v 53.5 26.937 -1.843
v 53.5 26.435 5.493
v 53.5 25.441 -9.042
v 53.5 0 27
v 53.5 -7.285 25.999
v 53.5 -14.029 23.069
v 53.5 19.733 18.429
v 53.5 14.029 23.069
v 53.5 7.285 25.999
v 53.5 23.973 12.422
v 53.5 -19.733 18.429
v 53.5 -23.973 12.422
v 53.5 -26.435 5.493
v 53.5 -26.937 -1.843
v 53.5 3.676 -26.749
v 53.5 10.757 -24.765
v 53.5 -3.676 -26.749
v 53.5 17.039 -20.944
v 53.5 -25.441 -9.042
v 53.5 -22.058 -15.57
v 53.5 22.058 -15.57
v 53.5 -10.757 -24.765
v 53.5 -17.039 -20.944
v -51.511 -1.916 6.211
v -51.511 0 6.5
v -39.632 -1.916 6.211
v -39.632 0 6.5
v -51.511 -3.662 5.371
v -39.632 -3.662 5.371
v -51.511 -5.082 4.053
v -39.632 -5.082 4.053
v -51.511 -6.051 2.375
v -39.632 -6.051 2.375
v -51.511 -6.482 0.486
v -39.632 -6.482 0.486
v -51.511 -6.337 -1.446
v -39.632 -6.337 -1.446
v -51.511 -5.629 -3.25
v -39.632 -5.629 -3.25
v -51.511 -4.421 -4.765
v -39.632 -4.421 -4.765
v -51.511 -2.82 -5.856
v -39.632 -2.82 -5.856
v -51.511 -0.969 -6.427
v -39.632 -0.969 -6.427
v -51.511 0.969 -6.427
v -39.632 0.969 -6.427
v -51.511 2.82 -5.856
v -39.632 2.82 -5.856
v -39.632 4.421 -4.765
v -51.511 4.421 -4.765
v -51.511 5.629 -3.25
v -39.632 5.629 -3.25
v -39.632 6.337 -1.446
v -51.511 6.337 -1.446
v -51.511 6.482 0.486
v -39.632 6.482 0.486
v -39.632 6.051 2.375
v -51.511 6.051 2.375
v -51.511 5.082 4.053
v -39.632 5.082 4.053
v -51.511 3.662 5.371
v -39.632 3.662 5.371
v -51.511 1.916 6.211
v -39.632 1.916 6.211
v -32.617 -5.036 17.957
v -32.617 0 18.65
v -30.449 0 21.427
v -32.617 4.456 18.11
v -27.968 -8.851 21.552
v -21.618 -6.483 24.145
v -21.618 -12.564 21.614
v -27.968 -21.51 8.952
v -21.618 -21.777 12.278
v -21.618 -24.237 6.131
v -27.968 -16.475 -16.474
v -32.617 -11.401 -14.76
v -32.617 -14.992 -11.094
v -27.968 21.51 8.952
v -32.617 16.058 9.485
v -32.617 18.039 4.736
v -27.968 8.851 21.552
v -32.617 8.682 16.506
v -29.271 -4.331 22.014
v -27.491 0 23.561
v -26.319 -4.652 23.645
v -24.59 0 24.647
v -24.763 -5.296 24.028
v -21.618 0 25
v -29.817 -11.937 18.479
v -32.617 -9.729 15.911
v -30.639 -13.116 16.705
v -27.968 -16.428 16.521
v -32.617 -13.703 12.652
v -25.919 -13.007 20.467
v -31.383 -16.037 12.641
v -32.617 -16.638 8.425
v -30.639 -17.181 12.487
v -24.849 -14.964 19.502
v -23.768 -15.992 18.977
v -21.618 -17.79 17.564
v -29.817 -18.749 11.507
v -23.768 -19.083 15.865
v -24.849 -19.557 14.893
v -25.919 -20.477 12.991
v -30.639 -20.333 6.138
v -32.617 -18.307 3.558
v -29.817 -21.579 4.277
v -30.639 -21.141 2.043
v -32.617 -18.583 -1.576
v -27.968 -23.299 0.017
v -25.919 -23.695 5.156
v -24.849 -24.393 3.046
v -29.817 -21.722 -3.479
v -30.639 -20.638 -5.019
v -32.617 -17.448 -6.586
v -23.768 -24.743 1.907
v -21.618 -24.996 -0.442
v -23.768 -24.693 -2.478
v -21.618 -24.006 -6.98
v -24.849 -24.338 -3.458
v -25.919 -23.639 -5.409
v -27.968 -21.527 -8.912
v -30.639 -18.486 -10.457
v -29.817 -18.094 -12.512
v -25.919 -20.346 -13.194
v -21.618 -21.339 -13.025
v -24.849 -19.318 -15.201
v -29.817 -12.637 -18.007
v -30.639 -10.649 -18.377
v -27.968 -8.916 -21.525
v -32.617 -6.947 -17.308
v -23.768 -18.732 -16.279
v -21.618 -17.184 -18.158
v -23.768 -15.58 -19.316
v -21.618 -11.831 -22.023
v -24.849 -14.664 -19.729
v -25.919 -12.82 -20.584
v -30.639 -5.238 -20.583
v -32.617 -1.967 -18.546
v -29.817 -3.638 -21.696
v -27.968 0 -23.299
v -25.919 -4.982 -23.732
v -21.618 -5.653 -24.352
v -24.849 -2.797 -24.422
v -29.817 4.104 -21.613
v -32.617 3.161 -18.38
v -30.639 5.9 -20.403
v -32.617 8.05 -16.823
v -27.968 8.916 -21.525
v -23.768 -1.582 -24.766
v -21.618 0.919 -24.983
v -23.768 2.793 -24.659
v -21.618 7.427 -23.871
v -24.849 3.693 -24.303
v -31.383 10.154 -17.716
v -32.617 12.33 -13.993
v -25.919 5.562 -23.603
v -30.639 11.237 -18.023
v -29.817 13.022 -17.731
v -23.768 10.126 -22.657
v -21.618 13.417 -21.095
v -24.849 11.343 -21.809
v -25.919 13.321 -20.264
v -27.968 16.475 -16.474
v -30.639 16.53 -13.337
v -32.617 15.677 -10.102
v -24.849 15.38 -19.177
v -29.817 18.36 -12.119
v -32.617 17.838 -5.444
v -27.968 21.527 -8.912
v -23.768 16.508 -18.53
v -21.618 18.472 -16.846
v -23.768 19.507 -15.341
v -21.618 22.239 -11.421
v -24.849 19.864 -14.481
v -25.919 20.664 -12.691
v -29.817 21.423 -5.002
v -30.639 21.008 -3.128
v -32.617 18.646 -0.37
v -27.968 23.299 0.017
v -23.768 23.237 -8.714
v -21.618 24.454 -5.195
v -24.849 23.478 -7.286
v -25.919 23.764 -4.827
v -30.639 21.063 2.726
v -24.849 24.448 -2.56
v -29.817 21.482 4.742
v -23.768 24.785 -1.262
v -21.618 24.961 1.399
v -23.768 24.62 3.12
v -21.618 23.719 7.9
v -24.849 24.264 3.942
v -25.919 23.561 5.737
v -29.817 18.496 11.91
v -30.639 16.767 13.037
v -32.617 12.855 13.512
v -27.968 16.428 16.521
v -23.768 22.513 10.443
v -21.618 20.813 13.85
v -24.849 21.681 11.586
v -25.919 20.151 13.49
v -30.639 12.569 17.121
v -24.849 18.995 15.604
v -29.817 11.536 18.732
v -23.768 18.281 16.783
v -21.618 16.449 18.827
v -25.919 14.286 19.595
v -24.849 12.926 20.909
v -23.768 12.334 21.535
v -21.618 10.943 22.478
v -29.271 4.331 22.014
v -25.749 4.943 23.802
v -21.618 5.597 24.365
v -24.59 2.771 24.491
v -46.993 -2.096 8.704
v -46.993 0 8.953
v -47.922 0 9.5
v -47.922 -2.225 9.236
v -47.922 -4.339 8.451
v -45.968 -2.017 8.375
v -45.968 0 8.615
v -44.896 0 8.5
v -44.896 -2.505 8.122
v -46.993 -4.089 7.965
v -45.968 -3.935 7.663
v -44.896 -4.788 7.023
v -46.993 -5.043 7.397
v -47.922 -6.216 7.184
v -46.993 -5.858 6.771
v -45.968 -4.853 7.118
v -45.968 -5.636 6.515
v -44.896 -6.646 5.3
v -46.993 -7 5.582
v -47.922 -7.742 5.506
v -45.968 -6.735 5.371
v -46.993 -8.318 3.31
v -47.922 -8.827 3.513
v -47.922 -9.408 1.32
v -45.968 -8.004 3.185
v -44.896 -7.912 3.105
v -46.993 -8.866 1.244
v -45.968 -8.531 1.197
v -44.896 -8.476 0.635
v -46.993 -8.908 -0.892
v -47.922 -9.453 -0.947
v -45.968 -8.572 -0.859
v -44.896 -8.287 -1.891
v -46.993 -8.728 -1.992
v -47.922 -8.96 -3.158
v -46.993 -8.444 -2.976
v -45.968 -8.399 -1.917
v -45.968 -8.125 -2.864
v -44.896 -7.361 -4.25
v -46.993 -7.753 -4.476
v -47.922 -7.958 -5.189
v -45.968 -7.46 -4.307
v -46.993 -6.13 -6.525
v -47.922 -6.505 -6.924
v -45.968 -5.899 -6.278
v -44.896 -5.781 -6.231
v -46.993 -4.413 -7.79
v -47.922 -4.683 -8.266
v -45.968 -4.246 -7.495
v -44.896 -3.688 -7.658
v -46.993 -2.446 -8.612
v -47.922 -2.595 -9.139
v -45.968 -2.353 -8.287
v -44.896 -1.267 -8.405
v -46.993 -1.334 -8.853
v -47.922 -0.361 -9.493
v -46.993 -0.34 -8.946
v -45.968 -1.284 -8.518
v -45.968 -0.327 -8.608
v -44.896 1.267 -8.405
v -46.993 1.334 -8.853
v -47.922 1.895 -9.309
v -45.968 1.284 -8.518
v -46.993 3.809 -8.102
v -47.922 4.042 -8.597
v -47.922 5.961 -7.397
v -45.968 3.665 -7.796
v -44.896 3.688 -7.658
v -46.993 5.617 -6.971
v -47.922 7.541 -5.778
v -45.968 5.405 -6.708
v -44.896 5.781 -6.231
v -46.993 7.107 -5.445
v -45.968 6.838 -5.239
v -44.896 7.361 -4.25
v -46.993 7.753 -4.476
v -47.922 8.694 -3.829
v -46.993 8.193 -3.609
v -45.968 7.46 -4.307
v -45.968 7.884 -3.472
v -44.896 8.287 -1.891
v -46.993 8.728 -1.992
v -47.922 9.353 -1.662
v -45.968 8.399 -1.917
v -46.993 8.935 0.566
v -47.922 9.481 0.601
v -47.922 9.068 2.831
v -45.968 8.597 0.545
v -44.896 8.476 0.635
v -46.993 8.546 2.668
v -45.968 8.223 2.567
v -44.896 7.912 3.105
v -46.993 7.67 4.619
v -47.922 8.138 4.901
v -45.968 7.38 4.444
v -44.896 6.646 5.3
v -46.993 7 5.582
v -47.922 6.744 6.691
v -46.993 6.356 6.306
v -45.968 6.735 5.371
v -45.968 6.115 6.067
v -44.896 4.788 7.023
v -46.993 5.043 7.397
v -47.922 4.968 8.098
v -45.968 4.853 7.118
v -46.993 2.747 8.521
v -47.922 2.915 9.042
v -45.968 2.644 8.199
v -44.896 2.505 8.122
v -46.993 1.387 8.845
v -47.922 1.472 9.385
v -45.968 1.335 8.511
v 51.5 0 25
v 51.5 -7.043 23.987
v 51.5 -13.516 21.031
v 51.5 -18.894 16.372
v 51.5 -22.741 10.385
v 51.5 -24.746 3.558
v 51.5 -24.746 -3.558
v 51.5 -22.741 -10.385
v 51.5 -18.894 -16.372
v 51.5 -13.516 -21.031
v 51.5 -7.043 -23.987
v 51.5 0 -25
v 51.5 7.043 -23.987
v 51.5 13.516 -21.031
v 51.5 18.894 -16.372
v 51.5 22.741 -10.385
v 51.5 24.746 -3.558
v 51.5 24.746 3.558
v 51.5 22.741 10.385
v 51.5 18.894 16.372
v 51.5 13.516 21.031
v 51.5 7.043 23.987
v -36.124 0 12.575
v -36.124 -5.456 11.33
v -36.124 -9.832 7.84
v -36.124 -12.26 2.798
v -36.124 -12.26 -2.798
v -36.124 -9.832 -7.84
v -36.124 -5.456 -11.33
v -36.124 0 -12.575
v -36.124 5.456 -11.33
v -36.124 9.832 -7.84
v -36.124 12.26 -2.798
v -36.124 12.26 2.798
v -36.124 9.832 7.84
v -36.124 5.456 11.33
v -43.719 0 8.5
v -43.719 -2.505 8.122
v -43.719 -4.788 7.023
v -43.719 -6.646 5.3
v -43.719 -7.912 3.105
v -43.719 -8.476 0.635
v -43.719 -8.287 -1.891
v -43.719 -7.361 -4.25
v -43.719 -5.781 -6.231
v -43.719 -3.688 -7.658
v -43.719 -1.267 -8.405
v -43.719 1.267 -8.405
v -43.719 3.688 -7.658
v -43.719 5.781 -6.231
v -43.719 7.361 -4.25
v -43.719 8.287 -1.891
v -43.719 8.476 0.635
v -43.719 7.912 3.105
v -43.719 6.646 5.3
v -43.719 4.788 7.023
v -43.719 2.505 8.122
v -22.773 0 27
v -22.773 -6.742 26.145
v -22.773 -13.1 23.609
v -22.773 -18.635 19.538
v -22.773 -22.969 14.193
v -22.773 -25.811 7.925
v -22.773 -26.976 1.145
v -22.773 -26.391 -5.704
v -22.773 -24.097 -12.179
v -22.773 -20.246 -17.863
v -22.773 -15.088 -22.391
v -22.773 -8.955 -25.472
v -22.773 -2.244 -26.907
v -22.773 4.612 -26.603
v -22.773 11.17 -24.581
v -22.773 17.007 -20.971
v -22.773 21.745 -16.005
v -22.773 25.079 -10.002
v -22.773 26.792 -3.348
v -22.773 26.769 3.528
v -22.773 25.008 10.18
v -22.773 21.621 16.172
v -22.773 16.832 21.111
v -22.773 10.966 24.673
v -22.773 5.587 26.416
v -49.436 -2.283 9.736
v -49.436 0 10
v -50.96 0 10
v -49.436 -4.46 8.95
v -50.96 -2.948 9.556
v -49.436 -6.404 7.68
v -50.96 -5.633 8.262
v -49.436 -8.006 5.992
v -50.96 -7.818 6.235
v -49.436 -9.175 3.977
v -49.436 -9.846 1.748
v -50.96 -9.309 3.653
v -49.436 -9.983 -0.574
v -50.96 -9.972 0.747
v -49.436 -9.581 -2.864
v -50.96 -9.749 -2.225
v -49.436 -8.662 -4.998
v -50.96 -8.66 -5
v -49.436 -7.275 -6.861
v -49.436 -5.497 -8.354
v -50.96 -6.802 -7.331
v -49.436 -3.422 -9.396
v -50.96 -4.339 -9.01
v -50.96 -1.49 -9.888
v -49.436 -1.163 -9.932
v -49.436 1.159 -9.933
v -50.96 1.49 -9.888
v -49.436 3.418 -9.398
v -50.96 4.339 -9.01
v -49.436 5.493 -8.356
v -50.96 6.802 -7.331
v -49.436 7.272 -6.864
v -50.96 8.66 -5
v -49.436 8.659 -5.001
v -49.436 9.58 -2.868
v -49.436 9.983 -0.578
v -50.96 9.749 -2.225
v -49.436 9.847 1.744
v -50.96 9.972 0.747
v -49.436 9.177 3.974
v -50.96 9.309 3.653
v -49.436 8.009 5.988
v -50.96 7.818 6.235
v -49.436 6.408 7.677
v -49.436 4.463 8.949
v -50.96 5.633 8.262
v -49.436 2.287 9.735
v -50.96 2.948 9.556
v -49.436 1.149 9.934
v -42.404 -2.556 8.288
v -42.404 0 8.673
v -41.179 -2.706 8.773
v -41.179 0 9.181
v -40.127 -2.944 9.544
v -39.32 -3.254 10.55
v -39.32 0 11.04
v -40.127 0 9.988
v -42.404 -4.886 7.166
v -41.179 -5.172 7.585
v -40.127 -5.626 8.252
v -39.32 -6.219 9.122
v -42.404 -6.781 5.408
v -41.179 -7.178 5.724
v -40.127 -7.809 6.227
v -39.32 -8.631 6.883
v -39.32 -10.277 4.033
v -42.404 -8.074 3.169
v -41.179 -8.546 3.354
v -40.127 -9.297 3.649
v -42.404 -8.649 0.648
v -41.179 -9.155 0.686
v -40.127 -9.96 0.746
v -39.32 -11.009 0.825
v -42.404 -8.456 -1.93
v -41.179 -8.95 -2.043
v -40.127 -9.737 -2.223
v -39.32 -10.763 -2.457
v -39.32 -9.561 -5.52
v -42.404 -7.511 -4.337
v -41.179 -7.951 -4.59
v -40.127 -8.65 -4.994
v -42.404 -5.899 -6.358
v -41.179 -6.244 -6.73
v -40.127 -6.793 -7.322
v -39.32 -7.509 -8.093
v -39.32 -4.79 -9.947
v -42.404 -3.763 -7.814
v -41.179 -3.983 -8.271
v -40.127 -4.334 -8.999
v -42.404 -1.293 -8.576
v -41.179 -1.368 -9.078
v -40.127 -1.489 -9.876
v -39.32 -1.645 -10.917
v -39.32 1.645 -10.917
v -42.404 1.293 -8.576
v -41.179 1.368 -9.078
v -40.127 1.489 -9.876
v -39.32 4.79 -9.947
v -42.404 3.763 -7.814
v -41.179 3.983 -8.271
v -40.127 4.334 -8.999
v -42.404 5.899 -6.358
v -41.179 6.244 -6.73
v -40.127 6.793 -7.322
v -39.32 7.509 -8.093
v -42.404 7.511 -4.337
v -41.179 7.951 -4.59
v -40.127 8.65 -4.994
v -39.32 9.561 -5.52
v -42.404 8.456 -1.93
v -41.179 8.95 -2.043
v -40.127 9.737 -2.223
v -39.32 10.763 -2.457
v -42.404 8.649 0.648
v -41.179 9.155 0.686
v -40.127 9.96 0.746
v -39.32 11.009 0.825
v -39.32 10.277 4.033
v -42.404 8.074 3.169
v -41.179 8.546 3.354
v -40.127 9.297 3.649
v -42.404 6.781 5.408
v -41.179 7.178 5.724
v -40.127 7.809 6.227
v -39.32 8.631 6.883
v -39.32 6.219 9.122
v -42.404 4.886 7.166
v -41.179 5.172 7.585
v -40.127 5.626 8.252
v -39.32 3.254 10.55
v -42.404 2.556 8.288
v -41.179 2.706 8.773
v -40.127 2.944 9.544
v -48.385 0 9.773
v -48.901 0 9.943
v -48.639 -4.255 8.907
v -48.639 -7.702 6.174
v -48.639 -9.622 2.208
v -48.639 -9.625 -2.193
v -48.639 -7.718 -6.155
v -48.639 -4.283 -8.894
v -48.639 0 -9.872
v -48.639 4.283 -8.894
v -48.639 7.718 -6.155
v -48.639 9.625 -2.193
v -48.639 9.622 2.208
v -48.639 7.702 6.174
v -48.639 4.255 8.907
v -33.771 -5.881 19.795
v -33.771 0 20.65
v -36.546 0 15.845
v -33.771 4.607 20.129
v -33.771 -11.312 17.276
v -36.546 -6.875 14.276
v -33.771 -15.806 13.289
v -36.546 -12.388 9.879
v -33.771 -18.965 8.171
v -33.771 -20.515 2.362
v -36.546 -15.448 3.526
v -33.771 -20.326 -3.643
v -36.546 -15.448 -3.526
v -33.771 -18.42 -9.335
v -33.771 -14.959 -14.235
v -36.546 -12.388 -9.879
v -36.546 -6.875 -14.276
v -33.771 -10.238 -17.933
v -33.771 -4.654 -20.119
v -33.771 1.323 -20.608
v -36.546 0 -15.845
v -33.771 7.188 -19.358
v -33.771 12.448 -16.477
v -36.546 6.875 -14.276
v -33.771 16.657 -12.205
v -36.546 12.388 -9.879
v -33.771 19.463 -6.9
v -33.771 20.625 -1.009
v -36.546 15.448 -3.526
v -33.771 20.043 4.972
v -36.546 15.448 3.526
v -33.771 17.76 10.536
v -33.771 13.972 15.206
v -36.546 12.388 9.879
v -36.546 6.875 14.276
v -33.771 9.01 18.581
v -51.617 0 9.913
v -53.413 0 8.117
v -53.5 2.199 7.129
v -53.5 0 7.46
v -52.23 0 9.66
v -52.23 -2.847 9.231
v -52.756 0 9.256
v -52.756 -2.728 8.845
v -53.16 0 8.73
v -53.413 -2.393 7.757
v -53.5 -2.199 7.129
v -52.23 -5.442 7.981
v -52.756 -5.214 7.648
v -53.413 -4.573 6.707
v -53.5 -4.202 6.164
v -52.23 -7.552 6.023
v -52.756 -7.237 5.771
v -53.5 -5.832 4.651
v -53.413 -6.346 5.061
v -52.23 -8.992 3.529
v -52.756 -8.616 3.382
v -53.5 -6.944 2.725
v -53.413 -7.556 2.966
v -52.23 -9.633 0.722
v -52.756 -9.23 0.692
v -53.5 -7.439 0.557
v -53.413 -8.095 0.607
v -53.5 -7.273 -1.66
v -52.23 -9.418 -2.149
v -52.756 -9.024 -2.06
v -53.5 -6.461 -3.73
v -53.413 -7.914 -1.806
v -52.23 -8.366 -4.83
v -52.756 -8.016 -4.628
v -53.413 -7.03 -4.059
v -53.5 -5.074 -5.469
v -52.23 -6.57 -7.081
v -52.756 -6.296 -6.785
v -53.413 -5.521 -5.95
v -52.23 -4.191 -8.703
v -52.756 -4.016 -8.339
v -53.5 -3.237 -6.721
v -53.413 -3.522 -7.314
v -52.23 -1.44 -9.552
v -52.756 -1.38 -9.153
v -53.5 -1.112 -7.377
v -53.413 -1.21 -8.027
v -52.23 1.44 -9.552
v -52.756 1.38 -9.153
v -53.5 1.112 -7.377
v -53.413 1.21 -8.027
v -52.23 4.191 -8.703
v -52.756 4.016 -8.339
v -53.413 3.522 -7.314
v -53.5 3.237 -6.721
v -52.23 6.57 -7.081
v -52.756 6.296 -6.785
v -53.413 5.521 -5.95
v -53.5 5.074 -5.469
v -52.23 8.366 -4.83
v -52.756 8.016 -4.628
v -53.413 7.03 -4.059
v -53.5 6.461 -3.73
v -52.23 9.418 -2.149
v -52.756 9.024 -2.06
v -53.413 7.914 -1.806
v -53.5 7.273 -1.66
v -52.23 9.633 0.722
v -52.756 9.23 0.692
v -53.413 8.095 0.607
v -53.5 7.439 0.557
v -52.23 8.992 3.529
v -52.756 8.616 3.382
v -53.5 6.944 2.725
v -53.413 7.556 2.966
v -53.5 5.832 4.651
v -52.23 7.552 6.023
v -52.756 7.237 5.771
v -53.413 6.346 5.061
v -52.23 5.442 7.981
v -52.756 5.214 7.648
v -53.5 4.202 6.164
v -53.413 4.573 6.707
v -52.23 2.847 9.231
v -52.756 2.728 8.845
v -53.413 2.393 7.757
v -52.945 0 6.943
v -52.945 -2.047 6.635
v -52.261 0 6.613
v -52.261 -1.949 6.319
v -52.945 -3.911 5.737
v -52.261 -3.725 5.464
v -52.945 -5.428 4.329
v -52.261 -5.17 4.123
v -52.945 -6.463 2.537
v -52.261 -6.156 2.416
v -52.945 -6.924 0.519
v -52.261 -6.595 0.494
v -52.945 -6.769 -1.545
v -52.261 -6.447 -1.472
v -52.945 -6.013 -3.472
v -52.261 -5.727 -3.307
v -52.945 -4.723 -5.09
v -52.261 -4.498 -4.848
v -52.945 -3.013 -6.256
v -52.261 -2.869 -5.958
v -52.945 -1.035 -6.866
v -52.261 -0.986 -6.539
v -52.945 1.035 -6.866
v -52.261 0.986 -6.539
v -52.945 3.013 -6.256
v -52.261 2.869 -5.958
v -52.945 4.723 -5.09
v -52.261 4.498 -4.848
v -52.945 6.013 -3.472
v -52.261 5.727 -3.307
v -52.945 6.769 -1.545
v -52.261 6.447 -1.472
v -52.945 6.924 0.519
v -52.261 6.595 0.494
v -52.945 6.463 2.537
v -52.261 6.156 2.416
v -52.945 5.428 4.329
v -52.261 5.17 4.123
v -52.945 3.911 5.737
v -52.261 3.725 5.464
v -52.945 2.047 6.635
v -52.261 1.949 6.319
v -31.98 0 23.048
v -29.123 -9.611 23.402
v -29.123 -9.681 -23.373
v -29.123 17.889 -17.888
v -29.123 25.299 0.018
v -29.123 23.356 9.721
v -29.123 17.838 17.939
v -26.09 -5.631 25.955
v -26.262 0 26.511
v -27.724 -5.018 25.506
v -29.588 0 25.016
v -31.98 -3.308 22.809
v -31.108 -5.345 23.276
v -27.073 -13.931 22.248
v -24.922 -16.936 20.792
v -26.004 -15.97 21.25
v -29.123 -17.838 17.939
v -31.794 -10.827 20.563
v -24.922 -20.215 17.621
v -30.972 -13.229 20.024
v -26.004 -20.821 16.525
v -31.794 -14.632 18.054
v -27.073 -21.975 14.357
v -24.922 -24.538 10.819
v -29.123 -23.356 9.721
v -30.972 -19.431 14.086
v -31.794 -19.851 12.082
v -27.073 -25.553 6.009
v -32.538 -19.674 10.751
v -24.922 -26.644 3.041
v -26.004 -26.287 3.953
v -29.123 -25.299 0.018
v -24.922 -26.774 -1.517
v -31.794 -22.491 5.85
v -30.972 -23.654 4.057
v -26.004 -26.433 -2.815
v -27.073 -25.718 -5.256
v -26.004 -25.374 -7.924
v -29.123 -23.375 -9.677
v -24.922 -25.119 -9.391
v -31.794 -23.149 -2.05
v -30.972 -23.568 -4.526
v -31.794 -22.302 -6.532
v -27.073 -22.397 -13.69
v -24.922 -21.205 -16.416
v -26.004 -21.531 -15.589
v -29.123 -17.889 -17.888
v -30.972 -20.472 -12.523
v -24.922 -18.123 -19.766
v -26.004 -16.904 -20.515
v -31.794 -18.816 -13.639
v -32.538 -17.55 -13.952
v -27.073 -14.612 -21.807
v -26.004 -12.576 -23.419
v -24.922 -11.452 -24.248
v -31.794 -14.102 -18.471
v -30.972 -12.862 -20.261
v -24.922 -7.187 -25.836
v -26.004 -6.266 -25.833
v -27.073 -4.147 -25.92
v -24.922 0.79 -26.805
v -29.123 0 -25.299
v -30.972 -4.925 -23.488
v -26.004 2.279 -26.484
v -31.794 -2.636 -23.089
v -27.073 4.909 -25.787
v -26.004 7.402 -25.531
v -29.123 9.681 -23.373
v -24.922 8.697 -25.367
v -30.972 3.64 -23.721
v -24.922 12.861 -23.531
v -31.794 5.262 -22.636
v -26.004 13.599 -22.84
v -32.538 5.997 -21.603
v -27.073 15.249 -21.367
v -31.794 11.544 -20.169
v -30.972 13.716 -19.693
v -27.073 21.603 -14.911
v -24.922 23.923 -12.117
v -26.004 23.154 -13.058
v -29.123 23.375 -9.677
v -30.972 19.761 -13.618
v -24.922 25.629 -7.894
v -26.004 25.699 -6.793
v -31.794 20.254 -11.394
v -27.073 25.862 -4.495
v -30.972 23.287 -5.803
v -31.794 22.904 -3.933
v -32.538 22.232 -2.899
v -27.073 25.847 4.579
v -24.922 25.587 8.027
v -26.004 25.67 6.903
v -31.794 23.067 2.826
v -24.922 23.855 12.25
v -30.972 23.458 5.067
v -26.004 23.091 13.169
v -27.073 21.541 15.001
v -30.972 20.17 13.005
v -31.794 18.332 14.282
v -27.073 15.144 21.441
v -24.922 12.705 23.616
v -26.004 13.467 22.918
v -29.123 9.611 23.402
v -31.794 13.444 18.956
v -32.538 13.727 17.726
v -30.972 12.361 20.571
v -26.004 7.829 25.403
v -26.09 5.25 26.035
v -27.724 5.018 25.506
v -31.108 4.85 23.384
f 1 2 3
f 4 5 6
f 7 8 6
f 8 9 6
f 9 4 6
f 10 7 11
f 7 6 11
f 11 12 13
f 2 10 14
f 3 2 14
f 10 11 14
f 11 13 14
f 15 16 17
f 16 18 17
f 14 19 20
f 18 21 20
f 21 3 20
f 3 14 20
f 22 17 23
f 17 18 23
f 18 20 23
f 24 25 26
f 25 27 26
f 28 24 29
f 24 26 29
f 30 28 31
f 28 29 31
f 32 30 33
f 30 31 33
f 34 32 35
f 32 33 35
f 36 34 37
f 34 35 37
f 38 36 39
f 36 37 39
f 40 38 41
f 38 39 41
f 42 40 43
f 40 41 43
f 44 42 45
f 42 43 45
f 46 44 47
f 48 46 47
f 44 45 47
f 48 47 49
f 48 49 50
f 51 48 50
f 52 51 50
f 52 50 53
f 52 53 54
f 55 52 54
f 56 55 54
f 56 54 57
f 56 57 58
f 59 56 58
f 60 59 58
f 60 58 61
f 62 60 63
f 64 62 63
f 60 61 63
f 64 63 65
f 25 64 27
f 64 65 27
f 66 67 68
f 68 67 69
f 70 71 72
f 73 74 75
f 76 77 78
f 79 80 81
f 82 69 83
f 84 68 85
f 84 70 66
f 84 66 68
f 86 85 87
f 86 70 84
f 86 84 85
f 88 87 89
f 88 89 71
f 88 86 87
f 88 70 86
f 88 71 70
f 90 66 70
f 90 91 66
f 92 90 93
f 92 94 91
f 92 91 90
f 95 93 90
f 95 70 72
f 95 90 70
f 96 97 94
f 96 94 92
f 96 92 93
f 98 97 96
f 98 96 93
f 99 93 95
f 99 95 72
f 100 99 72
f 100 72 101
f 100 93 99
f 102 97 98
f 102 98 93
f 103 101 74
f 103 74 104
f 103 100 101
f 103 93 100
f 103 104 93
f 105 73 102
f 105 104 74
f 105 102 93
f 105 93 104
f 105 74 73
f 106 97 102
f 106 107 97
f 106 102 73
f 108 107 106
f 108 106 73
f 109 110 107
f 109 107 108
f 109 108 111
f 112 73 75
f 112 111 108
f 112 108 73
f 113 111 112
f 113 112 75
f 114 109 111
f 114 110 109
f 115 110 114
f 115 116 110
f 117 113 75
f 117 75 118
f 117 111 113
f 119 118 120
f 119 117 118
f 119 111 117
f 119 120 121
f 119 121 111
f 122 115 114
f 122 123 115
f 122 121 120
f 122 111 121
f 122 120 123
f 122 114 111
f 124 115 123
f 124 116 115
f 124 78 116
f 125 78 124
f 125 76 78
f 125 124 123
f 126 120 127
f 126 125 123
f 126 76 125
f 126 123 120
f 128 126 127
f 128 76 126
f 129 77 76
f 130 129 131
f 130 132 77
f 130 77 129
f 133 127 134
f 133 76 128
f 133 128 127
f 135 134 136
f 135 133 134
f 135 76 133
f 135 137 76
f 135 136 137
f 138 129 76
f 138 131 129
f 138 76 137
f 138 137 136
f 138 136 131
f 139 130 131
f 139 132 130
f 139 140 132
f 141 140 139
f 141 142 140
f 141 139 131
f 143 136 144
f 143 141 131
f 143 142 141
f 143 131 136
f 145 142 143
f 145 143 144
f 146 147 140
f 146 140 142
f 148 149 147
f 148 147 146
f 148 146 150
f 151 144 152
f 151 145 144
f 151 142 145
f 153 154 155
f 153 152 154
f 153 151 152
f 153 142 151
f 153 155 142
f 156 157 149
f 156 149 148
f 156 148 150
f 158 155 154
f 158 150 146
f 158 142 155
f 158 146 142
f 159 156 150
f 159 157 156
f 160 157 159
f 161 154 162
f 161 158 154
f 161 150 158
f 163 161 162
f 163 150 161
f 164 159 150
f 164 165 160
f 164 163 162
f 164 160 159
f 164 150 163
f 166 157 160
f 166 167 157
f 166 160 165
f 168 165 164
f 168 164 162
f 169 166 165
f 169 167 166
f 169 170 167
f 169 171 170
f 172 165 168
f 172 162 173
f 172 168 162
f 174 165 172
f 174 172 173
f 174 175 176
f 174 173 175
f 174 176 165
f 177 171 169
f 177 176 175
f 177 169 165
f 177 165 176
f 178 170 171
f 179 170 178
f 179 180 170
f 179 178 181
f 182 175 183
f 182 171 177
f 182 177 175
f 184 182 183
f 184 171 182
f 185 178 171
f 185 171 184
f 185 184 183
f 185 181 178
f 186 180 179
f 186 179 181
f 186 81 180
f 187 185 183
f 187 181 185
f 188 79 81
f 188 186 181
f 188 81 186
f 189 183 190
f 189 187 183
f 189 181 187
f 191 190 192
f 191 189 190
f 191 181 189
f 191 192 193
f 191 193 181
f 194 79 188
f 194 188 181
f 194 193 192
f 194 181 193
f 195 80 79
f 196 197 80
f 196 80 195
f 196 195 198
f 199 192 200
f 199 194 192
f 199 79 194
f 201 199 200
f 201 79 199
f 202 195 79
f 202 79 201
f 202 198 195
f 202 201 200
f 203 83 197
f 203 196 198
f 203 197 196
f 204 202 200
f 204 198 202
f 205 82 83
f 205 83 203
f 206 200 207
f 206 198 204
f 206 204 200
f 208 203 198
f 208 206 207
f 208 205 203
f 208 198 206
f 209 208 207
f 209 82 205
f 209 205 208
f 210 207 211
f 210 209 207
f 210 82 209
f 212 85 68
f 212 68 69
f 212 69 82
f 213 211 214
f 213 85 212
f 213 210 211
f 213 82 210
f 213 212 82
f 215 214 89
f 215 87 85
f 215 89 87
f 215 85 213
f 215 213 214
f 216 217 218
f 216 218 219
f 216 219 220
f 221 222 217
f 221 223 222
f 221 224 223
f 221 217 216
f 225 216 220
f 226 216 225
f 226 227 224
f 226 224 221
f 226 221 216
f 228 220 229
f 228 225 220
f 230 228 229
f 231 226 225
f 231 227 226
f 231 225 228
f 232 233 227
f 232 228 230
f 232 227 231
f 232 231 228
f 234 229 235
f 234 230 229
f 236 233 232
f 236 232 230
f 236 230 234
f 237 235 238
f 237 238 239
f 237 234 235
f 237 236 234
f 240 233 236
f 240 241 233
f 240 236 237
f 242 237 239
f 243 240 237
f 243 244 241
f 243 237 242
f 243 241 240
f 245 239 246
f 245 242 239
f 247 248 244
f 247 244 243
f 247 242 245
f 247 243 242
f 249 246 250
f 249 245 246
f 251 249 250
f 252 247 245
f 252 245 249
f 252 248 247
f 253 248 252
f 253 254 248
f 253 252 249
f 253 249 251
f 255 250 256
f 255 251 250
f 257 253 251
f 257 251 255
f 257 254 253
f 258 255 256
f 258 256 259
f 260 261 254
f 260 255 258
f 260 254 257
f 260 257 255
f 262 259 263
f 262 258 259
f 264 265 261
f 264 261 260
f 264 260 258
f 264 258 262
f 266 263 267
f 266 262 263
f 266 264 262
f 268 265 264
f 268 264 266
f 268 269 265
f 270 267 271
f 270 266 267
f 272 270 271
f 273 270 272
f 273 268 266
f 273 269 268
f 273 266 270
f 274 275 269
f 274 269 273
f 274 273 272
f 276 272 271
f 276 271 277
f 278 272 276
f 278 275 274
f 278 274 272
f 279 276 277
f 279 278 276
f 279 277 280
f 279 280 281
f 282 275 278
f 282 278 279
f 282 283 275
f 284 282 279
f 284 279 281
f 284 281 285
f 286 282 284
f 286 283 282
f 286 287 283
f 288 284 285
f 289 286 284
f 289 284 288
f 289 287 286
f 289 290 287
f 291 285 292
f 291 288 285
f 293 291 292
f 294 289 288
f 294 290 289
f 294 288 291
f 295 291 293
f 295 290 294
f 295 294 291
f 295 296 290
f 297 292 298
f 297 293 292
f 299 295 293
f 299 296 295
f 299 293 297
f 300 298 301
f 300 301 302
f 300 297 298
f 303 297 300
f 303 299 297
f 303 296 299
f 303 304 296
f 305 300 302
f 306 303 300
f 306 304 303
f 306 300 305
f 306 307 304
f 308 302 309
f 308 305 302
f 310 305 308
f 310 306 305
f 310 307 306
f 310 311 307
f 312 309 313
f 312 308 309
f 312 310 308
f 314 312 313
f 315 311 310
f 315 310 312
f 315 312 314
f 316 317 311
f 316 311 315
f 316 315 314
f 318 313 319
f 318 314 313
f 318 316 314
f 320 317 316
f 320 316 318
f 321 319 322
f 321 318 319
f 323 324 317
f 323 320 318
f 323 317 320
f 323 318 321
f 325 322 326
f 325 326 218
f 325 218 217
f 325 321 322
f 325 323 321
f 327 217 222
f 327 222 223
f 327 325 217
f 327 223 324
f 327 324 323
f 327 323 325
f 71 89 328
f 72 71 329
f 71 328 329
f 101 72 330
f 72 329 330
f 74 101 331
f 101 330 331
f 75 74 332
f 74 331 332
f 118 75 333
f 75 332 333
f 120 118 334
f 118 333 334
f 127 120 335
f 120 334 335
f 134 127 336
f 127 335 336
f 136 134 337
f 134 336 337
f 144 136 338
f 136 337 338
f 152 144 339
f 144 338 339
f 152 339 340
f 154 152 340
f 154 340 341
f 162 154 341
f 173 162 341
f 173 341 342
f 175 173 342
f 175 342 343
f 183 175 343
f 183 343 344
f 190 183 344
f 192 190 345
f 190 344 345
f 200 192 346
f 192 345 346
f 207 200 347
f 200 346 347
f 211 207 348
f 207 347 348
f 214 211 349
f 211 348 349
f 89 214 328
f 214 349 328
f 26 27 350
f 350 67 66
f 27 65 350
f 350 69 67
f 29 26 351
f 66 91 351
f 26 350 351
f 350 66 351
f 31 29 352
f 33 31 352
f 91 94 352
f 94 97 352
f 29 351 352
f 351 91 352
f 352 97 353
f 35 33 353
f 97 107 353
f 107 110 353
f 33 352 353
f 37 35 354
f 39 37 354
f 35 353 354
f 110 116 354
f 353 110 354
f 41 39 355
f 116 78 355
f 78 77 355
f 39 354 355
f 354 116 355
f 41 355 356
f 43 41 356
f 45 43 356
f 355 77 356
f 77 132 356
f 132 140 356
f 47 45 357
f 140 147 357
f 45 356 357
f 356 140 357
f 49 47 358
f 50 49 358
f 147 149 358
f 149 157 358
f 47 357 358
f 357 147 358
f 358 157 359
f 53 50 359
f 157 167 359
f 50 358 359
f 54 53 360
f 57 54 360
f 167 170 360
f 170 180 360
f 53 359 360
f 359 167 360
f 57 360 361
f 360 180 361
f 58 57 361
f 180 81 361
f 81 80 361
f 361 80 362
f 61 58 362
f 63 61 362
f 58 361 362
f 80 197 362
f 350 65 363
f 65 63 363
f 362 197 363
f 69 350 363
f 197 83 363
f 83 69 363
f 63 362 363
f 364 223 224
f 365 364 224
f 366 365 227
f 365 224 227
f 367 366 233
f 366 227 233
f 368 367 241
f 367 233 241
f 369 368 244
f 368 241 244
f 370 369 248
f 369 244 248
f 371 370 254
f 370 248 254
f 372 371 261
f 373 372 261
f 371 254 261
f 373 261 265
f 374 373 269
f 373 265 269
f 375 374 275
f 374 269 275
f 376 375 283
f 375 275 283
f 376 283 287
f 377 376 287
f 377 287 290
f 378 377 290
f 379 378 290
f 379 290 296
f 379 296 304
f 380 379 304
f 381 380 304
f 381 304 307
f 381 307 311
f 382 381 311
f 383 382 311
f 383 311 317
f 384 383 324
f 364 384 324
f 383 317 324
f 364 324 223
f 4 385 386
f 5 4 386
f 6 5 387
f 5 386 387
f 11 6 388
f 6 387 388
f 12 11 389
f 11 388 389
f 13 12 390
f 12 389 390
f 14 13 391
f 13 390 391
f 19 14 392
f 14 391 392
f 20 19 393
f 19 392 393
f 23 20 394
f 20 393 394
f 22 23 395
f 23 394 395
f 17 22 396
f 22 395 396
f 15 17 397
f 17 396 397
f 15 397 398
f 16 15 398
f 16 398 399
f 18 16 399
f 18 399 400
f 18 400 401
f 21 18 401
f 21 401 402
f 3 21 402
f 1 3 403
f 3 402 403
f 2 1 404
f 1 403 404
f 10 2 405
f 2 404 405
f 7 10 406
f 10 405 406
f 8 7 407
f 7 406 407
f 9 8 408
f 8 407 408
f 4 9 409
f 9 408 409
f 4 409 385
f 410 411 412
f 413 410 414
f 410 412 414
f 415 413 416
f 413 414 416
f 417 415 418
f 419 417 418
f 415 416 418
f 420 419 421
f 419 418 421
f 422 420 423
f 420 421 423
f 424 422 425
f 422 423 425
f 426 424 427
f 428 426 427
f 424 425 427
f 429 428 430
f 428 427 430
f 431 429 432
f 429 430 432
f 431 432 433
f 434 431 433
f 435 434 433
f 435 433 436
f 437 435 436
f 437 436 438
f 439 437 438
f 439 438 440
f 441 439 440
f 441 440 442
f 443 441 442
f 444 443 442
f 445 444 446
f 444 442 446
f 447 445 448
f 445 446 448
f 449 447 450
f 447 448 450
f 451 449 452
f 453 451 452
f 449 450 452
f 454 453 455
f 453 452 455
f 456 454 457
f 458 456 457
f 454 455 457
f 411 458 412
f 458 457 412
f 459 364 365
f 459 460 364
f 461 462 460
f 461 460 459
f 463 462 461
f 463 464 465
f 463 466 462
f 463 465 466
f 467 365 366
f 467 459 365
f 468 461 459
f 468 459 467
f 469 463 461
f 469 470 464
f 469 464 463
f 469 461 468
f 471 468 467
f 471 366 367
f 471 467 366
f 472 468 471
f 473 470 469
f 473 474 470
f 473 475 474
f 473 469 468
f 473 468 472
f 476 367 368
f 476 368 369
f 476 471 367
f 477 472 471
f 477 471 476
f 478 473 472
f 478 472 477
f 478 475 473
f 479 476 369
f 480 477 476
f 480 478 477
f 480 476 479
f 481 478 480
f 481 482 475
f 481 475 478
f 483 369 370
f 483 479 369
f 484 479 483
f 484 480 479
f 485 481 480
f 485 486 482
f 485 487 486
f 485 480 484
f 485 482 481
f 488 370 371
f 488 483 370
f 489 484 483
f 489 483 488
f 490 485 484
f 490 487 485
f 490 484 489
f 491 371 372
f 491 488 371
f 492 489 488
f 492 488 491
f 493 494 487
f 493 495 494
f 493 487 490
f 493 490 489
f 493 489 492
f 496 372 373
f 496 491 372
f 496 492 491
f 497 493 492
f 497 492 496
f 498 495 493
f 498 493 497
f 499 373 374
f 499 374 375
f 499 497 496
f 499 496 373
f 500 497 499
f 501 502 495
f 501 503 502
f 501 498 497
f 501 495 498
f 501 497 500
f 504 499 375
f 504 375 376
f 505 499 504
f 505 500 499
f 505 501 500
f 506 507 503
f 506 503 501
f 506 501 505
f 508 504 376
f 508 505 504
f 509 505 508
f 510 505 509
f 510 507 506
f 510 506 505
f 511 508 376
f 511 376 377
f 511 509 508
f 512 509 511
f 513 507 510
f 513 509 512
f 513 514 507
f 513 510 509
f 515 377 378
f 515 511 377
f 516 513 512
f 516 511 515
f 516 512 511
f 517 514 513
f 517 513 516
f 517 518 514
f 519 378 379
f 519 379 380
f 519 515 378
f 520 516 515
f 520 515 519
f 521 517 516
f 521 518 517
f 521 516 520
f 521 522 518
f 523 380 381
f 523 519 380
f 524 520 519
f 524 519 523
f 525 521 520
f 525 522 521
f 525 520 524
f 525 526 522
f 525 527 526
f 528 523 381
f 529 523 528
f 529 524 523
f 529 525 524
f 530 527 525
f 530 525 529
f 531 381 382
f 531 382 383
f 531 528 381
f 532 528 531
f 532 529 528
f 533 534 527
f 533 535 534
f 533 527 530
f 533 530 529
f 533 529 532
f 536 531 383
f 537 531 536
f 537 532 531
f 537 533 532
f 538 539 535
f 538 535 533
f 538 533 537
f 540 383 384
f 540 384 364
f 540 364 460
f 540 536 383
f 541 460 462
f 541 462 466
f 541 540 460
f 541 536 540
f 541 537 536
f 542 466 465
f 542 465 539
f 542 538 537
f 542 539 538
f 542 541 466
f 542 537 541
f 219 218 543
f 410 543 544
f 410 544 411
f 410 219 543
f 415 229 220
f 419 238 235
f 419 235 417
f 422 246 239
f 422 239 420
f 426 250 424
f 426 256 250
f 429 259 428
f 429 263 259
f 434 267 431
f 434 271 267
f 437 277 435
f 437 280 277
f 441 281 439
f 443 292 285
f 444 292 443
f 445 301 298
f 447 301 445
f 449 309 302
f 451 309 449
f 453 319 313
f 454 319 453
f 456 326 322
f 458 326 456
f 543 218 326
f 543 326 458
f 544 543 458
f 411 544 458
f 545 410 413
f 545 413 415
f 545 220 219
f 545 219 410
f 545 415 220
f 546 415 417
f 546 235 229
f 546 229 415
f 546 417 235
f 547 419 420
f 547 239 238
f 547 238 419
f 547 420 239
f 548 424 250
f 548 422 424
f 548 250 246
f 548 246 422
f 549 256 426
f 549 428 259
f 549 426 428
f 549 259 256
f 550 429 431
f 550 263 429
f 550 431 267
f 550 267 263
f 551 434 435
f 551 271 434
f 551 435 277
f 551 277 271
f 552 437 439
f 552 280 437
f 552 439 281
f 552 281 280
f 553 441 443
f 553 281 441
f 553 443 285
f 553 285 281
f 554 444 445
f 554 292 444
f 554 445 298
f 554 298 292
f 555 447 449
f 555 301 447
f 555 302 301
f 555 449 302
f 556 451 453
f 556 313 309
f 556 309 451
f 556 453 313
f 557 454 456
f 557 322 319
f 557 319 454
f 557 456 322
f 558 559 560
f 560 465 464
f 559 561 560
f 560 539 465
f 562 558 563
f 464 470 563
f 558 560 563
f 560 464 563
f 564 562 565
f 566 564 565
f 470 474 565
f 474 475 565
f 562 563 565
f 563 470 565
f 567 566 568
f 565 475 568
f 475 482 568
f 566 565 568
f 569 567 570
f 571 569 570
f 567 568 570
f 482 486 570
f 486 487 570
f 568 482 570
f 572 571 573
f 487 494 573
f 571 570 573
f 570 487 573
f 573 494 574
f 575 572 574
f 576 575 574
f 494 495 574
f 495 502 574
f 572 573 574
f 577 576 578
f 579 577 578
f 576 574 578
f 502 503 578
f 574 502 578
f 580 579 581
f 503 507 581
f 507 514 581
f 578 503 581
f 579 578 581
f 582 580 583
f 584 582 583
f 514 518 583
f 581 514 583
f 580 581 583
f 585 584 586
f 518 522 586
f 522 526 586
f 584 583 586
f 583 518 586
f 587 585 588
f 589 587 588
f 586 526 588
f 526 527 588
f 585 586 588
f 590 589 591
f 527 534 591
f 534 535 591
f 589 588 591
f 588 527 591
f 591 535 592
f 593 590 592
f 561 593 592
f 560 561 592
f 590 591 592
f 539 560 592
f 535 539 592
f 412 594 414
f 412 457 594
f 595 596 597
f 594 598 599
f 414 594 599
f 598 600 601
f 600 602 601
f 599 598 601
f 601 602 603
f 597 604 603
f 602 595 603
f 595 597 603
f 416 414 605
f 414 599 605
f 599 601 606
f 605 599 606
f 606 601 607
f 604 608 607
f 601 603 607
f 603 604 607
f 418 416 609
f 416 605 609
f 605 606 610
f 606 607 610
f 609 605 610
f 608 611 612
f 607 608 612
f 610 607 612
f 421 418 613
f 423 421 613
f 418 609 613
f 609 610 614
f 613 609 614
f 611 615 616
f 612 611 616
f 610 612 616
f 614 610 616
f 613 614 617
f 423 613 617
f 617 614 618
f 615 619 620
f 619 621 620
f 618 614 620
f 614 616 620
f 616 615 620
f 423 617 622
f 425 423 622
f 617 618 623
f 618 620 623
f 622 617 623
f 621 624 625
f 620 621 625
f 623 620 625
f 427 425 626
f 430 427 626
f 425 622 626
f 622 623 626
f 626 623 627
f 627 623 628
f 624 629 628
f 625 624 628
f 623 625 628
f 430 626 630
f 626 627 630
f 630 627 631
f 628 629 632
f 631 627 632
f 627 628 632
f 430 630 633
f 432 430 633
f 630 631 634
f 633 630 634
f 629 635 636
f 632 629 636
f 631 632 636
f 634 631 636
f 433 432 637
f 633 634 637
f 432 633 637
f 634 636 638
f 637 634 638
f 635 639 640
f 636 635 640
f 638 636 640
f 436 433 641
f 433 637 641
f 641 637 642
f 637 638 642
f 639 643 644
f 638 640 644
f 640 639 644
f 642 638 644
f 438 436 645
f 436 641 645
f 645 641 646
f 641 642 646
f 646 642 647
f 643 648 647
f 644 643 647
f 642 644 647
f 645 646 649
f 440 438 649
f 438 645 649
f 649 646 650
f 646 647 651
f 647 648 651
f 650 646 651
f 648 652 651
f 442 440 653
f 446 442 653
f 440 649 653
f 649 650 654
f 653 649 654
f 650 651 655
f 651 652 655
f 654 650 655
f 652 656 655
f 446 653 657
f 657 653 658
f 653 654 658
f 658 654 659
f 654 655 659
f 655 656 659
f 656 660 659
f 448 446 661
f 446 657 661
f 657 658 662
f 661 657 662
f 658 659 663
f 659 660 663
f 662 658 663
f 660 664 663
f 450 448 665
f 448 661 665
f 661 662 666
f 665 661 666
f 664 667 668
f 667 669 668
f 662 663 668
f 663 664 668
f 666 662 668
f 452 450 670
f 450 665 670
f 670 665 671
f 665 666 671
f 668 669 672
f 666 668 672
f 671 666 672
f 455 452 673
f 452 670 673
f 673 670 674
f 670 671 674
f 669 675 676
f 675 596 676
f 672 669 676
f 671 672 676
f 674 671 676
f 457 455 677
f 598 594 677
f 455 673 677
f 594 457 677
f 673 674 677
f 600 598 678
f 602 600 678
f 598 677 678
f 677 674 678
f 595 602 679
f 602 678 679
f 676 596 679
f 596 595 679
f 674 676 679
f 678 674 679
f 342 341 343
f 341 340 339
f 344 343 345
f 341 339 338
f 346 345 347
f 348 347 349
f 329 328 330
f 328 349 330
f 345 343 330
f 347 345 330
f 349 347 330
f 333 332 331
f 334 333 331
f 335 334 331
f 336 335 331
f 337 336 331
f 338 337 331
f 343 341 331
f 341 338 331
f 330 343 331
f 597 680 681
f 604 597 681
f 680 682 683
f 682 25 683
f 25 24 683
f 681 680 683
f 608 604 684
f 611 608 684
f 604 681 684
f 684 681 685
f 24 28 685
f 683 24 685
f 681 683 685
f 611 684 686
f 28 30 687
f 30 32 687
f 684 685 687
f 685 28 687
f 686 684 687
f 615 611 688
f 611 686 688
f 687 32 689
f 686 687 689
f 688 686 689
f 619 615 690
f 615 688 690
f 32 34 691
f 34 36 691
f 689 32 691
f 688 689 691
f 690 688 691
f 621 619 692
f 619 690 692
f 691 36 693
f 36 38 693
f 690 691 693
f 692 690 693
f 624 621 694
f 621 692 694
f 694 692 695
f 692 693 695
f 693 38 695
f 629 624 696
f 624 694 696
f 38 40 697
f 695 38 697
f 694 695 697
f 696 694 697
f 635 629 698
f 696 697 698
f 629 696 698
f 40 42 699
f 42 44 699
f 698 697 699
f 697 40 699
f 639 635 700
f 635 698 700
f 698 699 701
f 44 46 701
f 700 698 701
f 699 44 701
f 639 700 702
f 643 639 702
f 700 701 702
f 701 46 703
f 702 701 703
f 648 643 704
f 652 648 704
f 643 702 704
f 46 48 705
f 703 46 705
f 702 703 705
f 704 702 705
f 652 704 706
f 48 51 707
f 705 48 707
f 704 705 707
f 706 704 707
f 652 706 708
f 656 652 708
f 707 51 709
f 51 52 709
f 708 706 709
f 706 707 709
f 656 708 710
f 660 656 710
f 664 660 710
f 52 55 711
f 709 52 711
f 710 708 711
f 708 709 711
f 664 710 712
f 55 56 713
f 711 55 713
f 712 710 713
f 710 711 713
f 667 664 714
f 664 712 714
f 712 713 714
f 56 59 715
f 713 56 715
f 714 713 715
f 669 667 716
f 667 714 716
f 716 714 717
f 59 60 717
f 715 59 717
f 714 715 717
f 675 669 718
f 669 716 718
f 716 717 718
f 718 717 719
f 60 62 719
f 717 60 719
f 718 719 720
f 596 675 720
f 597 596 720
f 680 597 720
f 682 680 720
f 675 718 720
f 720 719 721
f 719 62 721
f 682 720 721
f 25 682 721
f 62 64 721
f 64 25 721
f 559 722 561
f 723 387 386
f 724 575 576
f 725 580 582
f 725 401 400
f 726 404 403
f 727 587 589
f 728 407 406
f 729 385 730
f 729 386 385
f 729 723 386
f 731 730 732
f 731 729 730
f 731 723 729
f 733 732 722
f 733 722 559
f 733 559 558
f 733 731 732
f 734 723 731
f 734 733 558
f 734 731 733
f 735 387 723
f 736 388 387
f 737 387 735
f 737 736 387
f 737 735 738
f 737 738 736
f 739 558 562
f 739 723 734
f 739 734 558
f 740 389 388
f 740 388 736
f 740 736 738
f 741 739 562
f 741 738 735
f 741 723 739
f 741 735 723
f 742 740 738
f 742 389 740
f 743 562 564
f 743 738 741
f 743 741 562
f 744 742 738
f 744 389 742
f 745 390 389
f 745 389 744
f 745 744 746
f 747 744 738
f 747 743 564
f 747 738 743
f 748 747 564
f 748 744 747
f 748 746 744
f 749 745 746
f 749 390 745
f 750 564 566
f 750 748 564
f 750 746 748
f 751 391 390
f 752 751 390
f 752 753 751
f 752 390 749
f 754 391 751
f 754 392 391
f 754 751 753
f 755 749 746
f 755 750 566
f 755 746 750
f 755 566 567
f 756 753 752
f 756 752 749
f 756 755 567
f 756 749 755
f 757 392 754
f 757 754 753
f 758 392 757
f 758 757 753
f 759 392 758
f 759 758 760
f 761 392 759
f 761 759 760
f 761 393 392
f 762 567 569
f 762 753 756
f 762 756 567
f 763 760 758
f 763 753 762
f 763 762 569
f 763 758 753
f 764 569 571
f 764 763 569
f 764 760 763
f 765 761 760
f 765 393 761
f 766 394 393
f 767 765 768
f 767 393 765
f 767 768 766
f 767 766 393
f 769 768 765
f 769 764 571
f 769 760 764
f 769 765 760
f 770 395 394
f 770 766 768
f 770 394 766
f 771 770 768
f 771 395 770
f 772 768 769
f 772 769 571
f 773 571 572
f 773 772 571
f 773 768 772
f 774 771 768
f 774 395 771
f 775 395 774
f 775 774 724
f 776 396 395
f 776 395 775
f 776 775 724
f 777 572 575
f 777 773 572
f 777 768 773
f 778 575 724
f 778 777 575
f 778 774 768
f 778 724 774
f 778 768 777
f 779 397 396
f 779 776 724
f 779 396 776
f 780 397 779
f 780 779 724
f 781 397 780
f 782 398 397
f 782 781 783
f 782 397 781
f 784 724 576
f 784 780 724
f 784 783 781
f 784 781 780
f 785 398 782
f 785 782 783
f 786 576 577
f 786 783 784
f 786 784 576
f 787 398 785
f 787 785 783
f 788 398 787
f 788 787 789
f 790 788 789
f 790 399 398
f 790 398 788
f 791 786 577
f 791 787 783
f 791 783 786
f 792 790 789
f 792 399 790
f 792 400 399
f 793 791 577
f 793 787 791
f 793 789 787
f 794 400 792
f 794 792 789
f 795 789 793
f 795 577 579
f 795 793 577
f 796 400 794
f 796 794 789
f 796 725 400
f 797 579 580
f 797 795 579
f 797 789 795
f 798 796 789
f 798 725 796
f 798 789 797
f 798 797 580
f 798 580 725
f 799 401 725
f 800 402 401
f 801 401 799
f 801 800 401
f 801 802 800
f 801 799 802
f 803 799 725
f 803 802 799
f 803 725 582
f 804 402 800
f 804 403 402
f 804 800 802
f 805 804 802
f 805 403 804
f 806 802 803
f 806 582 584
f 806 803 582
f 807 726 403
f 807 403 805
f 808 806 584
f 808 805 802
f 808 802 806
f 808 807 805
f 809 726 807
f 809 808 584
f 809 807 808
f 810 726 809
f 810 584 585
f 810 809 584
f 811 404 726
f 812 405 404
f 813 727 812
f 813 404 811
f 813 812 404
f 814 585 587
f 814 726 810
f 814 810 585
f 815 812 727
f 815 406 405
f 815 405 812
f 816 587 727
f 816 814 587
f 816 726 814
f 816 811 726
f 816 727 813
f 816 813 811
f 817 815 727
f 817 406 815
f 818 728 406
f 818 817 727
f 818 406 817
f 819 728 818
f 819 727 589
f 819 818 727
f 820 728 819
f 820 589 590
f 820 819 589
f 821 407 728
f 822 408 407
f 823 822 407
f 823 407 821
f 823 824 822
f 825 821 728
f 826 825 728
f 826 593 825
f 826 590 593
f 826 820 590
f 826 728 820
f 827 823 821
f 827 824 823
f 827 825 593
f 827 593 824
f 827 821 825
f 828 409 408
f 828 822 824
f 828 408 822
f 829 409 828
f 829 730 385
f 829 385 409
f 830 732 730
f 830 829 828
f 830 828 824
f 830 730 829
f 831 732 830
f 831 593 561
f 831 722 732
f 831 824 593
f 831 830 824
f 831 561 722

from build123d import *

# Parameters (mm, degrees)
F2_R = 12.7
F4_R = 2.54


# Not quite as in the source:
# - a fillet or chamfer that OpenCascade refuses, or shapes differently, is made with other operations: its cross-section is extruded or revolved along the edge and cut away or added


with BuildPart() as f1:
    # F0 (on Front) → F1 (revolve)
    with BuildSketch(Plane.XZ):
        Polygon((53.5, 27), (-30.1052267423, 27), (-40.7862067223, 8.5), (-48.5, 8.5), (-48.5, 10), (-53.5, 10), (-53.5, 6.5), (-39.6315061839, 6.5), (-28.9505262039, 25), (51.5, 25), (51.5, 0), (53.5, 0), align=None)
    revolve(axis=Axis((0, 0, 0), (1, 0, 0)))

    # F2
    f2_edges = [f1.edges().sort_by_distance(p)[0] for p in [
        (-30.105227, 0, -27),
        (-28.950526, 0, -25),
    ]]
    fillet(f2_edges, radius=F2_R)

    # F3: fillet of radius 5.08 on 2 edges, made by hand

    # F3_s1 → F3_t2 (revolve)
    with BuildSketch(Plane.XZ):
        with BuildLine():
            ThreePointArc((-43.7191460897, 8.5), (-41.1791460897, 9.1805909488), (-39.3197370385, 11.04))
            Line((-39.3197370385, 11.04), (-40.7862067223, 8.5))
            Line((-40.7862067223, 8.5), (-43.7191460897, 8.5))
        make_face()
    revolve(axis=Axis((-40.7862067223, 0, 0), (1, 0, 0)))

    # F3_s3 → F3_t4 (revolve)
    with BuildSketch(Plane.XZ):
        with BuildLine():
            ThreePointArc((-48.5, 10), (-46.8477578714, 8.8899680172), (-44.8958357418, 8.5))
            Line((-44.8958357418, 8.5), (-48.5, 8.5))
            Line((-48.5, 8.5), (-48.5, 10))
        make_face()
    revolve(axis=Axis((-48.5, 0, 0), (1, 0, 0)))

    # F4
    f4_edges = [f1.edges().sort_by_distance(p)[0] for p in [
        (-48.5, 0, -10),
        (-53.5, 0, -10),
    ]]
    fillet(f4_edges, radius=F4_R)

    # F5: fillet of radius 2.54 on 1 edges, made by hand

    # F5_s1 → F5_t2 (revolve, cut)
    with BuildSketch(Plane.XZ):
        with BuildLine():
            ThreePointArc((-53.5, 7.46), (-52.6154054362, 6.7525560116), (-51.5112315369, 6.5))
            Line((-51.5112315369, 6.5), (-53.5, 6.5))
            Line((-53.5, 6.5), (-53.5, 7.46))
        make_face()
    revolve(axis=Axis((-53.5, 0, 0), (1, 0, 0)), mode=Mode.SUBTRACT)


solid = f1.part
